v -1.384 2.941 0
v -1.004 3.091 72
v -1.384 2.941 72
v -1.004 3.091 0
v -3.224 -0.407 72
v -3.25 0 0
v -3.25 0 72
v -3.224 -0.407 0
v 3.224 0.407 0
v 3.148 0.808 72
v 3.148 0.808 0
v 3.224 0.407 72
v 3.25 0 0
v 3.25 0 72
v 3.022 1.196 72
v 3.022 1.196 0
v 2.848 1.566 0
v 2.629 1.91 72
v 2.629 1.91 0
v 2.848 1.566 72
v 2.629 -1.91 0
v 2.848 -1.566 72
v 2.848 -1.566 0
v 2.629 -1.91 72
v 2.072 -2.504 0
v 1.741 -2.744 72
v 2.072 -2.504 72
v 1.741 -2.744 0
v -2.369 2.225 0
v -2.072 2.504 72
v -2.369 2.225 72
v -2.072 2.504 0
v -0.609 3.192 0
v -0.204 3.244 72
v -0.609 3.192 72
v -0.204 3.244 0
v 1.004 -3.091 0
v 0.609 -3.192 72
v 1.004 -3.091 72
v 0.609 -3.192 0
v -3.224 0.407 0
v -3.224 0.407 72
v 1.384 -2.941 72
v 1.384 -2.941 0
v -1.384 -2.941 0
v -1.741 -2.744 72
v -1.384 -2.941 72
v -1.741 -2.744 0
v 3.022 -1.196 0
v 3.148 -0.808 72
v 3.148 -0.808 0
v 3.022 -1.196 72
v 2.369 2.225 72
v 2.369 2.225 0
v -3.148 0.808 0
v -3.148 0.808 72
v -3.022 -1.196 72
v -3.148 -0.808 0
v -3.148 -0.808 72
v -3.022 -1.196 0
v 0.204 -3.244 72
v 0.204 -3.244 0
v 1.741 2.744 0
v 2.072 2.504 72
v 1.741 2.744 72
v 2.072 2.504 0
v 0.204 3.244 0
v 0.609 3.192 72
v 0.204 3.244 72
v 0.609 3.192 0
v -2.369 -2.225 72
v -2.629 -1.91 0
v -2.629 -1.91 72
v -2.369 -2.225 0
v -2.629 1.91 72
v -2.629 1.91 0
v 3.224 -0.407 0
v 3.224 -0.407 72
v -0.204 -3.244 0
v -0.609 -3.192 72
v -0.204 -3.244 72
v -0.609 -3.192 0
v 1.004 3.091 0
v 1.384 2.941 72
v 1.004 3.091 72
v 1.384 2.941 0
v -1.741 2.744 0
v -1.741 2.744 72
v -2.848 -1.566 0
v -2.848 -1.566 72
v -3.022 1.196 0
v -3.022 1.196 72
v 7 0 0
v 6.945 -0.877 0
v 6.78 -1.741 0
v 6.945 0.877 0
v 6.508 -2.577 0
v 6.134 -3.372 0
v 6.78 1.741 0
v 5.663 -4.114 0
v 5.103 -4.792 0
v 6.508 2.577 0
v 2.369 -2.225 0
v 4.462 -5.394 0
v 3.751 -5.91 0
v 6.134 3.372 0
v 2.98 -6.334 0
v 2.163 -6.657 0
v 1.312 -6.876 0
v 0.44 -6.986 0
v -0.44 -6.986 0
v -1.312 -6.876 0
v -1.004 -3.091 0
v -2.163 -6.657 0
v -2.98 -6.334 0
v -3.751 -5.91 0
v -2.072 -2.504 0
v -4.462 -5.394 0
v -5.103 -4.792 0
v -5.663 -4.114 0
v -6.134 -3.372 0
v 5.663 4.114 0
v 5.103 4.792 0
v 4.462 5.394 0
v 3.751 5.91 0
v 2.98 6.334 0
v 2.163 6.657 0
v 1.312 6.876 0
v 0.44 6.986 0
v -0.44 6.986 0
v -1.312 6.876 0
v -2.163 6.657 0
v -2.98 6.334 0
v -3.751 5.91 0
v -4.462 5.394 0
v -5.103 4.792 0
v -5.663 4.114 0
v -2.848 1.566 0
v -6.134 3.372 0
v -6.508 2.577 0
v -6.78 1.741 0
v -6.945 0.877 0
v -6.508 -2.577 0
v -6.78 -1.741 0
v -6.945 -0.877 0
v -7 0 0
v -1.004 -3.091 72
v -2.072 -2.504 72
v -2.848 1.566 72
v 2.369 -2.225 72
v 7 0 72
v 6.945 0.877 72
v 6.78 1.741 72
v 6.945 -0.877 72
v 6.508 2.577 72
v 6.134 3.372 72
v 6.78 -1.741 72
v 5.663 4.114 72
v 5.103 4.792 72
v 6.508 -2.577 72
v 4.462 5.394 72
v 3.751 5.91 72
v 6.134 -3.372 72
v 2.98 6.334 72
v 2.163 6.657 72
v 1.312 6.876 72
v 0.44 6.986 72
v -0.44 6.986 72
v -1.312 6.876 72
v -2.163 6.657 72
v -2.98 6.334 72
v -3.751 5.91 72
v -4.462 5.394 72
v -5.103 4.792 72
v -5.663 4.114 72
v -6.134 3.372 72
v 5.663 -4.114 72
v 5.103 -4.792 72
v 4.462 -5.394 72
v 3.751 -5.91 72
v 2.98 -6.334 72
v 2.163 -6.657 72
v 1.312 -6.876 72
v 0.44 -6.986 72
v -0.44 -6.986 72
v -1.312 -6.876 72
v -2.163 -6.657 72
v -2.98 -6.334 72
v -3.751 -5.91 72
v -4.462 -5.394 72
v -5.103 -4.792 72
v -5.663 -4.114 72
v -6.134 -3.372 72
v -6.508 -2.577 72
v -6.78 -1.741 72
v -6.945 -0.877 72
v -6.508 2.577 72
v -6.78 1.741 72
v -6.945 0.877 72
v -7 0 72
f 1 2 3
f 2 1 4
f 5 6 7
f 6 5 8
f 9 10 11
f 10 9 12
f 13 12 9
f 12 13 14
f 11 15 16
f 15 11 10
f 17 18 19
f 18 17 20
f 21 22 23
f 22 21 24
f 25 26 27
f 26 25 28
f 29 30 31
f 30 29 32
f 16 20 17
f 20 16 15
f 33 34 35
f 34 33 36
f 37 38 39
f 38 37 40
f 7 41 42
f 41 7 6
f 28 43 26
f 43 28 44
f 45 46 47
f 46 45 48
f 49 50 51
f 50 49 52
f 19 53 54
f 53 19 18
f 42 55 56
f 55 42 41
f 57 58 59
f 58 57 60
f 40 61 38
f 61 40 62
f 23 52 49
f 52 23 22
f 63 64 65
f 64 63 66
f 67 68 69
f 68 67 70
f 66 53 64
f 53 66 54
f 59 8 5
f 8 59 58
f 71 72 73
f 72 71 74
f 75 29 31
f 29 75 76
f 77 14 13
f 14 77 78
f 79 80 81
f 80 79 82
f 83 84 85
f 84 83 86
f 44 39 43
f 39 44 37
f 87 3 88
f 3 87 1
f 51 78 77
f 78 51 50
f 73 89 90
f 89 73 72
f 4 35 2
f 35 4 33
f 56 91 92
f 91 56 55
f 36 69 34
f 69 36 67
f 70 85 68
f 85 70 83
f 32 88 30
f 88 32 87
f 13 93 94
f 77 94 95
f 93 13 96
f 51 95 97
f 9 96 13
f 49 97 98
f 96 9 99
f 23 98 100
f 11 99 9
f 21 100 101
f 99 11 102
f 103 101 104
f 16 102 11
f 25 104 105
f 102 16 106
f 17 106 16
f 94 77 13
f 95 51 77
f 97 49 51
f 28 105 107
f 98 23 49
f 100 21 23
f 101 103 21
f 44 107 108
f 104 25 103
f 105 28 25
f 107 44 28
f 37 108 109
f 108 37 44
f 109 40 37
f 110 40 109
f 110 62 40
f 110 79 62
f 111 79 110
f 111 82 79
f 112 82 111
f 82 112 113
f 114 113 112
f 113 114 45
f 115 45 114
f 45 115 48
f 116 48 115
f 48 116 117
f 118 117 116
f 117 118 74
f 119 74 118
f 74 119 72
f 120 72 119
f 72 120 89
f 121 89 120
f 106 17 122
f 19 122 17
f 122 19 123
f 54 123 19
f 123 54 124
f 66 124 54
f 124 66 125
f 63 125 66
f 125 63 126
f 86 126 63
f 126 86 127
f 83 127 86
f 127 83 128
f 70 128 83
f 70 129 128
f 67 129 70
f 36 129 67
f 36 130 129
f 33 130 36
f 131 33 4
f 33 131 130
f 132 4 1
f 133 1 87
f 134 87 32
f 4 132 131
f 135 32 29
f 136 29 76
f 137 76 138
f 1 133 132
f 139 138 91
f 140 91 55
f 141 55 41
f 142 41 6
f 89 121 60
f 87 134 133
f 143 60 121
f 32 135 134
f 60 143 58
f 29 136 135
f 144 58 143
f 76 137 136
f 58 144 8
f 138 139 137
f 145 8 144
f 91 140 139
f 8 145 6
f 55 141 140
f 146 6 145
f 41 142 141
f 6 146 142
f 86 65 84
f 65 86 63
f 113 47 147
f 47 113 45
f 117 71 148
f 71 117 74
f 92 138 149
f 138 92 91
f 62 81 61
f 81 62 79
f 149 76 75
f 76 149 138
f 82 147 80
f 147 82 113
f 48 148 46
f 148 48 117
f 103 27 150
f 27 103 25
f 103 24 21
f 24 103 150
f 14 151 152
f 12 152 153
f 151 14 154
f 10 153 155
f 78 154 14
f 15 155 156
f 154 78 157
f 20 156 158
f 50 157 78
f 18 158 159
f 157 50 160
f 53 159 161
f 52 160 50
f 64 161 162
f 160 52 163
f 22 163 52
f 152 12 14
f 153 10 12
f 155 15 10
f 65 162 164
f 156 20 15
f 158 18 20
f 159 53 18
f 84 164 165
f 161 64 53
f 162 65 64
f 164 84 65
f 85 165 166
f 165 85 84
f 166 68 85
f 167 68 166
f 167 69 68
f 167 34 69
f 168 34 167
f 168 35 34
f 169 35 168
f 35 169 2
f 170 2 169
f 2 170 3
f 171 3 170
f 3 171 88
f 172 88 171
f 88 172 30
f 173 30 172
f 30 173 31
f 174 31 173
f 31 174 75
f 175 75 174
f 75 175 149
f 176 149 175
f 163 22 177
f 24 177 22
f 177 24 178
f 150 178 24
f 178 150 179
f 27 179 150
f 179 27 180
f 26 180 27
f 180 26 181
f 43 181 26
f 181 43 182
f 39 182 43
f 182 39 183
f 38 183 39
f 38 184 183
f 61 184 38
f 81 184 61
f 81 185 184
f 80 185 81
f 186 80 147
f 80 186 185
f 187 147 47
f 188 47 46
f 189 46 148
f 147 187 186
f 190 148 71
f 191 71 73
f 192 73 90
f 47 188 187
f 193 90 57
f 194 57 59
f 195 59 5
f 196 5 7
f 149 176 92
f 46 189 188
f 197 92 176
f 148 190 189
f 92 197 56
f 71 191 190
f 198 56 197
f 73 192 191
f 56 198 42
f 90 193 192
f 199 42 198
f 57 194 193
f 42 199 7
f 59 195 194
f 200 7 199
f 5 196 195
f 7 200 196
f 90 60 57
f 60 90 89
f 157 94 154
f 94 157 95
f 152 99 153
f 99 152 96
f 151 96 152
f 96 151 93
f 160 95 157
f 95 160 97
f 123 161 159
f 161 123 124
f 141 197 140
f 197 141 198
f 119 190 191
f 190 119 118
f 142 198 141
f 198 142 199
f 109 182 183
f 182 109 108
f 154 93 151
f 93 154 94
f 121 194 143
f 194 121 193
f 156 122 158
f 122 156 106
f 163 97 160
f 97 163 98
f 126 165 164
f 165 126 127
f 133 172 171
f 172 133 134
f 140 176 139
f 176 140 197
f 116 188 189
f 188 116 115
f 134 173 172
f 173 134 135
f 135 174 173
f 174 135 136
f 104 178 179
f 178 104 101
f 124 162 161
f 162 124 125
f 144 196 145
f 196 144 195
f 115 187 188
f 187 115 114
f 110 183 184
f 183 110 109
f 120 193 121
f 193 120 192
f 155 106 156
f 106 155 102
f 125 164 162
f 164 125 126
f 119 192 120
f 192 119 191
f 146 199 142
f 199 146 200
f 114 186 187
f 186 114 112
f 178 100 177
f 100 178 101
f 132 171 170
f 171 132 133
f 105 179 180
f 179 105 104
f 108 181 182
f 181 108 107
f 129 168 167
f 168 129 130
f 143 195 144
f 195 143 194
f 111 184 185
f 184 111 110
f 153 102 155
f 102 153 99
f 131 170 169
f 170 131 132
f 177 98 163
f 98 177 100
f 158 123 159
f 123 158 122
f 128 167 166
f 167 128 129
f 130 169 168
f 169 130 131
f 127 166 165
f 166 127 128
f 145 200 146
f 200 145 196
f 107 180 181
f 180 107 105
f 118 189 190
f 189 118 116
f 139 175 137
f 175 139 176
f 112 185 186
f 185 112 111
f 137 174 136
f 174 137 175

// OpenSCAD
$fn = 50;


difference() {
	union() {
		cylinder(h = 72, r = 7.0000000000);
	}
	union() {
		cylinder(h = 72, r = 3.2500000000);
		cylinder(h = 72, r = 3.2500000000);
		cylinder(h = 72, r = 1.8000000000);
		cylinder(h = 72, r = 1.8000000000);
		cylinder(h = 72, r = 1.8000000000);
		cylinder(h = 72, r = 1.8000000000);
		cylinder(h = 72, r = 1.8000000000);
		cylinder(h = 72, r = 1.8000000000);
	}
}
